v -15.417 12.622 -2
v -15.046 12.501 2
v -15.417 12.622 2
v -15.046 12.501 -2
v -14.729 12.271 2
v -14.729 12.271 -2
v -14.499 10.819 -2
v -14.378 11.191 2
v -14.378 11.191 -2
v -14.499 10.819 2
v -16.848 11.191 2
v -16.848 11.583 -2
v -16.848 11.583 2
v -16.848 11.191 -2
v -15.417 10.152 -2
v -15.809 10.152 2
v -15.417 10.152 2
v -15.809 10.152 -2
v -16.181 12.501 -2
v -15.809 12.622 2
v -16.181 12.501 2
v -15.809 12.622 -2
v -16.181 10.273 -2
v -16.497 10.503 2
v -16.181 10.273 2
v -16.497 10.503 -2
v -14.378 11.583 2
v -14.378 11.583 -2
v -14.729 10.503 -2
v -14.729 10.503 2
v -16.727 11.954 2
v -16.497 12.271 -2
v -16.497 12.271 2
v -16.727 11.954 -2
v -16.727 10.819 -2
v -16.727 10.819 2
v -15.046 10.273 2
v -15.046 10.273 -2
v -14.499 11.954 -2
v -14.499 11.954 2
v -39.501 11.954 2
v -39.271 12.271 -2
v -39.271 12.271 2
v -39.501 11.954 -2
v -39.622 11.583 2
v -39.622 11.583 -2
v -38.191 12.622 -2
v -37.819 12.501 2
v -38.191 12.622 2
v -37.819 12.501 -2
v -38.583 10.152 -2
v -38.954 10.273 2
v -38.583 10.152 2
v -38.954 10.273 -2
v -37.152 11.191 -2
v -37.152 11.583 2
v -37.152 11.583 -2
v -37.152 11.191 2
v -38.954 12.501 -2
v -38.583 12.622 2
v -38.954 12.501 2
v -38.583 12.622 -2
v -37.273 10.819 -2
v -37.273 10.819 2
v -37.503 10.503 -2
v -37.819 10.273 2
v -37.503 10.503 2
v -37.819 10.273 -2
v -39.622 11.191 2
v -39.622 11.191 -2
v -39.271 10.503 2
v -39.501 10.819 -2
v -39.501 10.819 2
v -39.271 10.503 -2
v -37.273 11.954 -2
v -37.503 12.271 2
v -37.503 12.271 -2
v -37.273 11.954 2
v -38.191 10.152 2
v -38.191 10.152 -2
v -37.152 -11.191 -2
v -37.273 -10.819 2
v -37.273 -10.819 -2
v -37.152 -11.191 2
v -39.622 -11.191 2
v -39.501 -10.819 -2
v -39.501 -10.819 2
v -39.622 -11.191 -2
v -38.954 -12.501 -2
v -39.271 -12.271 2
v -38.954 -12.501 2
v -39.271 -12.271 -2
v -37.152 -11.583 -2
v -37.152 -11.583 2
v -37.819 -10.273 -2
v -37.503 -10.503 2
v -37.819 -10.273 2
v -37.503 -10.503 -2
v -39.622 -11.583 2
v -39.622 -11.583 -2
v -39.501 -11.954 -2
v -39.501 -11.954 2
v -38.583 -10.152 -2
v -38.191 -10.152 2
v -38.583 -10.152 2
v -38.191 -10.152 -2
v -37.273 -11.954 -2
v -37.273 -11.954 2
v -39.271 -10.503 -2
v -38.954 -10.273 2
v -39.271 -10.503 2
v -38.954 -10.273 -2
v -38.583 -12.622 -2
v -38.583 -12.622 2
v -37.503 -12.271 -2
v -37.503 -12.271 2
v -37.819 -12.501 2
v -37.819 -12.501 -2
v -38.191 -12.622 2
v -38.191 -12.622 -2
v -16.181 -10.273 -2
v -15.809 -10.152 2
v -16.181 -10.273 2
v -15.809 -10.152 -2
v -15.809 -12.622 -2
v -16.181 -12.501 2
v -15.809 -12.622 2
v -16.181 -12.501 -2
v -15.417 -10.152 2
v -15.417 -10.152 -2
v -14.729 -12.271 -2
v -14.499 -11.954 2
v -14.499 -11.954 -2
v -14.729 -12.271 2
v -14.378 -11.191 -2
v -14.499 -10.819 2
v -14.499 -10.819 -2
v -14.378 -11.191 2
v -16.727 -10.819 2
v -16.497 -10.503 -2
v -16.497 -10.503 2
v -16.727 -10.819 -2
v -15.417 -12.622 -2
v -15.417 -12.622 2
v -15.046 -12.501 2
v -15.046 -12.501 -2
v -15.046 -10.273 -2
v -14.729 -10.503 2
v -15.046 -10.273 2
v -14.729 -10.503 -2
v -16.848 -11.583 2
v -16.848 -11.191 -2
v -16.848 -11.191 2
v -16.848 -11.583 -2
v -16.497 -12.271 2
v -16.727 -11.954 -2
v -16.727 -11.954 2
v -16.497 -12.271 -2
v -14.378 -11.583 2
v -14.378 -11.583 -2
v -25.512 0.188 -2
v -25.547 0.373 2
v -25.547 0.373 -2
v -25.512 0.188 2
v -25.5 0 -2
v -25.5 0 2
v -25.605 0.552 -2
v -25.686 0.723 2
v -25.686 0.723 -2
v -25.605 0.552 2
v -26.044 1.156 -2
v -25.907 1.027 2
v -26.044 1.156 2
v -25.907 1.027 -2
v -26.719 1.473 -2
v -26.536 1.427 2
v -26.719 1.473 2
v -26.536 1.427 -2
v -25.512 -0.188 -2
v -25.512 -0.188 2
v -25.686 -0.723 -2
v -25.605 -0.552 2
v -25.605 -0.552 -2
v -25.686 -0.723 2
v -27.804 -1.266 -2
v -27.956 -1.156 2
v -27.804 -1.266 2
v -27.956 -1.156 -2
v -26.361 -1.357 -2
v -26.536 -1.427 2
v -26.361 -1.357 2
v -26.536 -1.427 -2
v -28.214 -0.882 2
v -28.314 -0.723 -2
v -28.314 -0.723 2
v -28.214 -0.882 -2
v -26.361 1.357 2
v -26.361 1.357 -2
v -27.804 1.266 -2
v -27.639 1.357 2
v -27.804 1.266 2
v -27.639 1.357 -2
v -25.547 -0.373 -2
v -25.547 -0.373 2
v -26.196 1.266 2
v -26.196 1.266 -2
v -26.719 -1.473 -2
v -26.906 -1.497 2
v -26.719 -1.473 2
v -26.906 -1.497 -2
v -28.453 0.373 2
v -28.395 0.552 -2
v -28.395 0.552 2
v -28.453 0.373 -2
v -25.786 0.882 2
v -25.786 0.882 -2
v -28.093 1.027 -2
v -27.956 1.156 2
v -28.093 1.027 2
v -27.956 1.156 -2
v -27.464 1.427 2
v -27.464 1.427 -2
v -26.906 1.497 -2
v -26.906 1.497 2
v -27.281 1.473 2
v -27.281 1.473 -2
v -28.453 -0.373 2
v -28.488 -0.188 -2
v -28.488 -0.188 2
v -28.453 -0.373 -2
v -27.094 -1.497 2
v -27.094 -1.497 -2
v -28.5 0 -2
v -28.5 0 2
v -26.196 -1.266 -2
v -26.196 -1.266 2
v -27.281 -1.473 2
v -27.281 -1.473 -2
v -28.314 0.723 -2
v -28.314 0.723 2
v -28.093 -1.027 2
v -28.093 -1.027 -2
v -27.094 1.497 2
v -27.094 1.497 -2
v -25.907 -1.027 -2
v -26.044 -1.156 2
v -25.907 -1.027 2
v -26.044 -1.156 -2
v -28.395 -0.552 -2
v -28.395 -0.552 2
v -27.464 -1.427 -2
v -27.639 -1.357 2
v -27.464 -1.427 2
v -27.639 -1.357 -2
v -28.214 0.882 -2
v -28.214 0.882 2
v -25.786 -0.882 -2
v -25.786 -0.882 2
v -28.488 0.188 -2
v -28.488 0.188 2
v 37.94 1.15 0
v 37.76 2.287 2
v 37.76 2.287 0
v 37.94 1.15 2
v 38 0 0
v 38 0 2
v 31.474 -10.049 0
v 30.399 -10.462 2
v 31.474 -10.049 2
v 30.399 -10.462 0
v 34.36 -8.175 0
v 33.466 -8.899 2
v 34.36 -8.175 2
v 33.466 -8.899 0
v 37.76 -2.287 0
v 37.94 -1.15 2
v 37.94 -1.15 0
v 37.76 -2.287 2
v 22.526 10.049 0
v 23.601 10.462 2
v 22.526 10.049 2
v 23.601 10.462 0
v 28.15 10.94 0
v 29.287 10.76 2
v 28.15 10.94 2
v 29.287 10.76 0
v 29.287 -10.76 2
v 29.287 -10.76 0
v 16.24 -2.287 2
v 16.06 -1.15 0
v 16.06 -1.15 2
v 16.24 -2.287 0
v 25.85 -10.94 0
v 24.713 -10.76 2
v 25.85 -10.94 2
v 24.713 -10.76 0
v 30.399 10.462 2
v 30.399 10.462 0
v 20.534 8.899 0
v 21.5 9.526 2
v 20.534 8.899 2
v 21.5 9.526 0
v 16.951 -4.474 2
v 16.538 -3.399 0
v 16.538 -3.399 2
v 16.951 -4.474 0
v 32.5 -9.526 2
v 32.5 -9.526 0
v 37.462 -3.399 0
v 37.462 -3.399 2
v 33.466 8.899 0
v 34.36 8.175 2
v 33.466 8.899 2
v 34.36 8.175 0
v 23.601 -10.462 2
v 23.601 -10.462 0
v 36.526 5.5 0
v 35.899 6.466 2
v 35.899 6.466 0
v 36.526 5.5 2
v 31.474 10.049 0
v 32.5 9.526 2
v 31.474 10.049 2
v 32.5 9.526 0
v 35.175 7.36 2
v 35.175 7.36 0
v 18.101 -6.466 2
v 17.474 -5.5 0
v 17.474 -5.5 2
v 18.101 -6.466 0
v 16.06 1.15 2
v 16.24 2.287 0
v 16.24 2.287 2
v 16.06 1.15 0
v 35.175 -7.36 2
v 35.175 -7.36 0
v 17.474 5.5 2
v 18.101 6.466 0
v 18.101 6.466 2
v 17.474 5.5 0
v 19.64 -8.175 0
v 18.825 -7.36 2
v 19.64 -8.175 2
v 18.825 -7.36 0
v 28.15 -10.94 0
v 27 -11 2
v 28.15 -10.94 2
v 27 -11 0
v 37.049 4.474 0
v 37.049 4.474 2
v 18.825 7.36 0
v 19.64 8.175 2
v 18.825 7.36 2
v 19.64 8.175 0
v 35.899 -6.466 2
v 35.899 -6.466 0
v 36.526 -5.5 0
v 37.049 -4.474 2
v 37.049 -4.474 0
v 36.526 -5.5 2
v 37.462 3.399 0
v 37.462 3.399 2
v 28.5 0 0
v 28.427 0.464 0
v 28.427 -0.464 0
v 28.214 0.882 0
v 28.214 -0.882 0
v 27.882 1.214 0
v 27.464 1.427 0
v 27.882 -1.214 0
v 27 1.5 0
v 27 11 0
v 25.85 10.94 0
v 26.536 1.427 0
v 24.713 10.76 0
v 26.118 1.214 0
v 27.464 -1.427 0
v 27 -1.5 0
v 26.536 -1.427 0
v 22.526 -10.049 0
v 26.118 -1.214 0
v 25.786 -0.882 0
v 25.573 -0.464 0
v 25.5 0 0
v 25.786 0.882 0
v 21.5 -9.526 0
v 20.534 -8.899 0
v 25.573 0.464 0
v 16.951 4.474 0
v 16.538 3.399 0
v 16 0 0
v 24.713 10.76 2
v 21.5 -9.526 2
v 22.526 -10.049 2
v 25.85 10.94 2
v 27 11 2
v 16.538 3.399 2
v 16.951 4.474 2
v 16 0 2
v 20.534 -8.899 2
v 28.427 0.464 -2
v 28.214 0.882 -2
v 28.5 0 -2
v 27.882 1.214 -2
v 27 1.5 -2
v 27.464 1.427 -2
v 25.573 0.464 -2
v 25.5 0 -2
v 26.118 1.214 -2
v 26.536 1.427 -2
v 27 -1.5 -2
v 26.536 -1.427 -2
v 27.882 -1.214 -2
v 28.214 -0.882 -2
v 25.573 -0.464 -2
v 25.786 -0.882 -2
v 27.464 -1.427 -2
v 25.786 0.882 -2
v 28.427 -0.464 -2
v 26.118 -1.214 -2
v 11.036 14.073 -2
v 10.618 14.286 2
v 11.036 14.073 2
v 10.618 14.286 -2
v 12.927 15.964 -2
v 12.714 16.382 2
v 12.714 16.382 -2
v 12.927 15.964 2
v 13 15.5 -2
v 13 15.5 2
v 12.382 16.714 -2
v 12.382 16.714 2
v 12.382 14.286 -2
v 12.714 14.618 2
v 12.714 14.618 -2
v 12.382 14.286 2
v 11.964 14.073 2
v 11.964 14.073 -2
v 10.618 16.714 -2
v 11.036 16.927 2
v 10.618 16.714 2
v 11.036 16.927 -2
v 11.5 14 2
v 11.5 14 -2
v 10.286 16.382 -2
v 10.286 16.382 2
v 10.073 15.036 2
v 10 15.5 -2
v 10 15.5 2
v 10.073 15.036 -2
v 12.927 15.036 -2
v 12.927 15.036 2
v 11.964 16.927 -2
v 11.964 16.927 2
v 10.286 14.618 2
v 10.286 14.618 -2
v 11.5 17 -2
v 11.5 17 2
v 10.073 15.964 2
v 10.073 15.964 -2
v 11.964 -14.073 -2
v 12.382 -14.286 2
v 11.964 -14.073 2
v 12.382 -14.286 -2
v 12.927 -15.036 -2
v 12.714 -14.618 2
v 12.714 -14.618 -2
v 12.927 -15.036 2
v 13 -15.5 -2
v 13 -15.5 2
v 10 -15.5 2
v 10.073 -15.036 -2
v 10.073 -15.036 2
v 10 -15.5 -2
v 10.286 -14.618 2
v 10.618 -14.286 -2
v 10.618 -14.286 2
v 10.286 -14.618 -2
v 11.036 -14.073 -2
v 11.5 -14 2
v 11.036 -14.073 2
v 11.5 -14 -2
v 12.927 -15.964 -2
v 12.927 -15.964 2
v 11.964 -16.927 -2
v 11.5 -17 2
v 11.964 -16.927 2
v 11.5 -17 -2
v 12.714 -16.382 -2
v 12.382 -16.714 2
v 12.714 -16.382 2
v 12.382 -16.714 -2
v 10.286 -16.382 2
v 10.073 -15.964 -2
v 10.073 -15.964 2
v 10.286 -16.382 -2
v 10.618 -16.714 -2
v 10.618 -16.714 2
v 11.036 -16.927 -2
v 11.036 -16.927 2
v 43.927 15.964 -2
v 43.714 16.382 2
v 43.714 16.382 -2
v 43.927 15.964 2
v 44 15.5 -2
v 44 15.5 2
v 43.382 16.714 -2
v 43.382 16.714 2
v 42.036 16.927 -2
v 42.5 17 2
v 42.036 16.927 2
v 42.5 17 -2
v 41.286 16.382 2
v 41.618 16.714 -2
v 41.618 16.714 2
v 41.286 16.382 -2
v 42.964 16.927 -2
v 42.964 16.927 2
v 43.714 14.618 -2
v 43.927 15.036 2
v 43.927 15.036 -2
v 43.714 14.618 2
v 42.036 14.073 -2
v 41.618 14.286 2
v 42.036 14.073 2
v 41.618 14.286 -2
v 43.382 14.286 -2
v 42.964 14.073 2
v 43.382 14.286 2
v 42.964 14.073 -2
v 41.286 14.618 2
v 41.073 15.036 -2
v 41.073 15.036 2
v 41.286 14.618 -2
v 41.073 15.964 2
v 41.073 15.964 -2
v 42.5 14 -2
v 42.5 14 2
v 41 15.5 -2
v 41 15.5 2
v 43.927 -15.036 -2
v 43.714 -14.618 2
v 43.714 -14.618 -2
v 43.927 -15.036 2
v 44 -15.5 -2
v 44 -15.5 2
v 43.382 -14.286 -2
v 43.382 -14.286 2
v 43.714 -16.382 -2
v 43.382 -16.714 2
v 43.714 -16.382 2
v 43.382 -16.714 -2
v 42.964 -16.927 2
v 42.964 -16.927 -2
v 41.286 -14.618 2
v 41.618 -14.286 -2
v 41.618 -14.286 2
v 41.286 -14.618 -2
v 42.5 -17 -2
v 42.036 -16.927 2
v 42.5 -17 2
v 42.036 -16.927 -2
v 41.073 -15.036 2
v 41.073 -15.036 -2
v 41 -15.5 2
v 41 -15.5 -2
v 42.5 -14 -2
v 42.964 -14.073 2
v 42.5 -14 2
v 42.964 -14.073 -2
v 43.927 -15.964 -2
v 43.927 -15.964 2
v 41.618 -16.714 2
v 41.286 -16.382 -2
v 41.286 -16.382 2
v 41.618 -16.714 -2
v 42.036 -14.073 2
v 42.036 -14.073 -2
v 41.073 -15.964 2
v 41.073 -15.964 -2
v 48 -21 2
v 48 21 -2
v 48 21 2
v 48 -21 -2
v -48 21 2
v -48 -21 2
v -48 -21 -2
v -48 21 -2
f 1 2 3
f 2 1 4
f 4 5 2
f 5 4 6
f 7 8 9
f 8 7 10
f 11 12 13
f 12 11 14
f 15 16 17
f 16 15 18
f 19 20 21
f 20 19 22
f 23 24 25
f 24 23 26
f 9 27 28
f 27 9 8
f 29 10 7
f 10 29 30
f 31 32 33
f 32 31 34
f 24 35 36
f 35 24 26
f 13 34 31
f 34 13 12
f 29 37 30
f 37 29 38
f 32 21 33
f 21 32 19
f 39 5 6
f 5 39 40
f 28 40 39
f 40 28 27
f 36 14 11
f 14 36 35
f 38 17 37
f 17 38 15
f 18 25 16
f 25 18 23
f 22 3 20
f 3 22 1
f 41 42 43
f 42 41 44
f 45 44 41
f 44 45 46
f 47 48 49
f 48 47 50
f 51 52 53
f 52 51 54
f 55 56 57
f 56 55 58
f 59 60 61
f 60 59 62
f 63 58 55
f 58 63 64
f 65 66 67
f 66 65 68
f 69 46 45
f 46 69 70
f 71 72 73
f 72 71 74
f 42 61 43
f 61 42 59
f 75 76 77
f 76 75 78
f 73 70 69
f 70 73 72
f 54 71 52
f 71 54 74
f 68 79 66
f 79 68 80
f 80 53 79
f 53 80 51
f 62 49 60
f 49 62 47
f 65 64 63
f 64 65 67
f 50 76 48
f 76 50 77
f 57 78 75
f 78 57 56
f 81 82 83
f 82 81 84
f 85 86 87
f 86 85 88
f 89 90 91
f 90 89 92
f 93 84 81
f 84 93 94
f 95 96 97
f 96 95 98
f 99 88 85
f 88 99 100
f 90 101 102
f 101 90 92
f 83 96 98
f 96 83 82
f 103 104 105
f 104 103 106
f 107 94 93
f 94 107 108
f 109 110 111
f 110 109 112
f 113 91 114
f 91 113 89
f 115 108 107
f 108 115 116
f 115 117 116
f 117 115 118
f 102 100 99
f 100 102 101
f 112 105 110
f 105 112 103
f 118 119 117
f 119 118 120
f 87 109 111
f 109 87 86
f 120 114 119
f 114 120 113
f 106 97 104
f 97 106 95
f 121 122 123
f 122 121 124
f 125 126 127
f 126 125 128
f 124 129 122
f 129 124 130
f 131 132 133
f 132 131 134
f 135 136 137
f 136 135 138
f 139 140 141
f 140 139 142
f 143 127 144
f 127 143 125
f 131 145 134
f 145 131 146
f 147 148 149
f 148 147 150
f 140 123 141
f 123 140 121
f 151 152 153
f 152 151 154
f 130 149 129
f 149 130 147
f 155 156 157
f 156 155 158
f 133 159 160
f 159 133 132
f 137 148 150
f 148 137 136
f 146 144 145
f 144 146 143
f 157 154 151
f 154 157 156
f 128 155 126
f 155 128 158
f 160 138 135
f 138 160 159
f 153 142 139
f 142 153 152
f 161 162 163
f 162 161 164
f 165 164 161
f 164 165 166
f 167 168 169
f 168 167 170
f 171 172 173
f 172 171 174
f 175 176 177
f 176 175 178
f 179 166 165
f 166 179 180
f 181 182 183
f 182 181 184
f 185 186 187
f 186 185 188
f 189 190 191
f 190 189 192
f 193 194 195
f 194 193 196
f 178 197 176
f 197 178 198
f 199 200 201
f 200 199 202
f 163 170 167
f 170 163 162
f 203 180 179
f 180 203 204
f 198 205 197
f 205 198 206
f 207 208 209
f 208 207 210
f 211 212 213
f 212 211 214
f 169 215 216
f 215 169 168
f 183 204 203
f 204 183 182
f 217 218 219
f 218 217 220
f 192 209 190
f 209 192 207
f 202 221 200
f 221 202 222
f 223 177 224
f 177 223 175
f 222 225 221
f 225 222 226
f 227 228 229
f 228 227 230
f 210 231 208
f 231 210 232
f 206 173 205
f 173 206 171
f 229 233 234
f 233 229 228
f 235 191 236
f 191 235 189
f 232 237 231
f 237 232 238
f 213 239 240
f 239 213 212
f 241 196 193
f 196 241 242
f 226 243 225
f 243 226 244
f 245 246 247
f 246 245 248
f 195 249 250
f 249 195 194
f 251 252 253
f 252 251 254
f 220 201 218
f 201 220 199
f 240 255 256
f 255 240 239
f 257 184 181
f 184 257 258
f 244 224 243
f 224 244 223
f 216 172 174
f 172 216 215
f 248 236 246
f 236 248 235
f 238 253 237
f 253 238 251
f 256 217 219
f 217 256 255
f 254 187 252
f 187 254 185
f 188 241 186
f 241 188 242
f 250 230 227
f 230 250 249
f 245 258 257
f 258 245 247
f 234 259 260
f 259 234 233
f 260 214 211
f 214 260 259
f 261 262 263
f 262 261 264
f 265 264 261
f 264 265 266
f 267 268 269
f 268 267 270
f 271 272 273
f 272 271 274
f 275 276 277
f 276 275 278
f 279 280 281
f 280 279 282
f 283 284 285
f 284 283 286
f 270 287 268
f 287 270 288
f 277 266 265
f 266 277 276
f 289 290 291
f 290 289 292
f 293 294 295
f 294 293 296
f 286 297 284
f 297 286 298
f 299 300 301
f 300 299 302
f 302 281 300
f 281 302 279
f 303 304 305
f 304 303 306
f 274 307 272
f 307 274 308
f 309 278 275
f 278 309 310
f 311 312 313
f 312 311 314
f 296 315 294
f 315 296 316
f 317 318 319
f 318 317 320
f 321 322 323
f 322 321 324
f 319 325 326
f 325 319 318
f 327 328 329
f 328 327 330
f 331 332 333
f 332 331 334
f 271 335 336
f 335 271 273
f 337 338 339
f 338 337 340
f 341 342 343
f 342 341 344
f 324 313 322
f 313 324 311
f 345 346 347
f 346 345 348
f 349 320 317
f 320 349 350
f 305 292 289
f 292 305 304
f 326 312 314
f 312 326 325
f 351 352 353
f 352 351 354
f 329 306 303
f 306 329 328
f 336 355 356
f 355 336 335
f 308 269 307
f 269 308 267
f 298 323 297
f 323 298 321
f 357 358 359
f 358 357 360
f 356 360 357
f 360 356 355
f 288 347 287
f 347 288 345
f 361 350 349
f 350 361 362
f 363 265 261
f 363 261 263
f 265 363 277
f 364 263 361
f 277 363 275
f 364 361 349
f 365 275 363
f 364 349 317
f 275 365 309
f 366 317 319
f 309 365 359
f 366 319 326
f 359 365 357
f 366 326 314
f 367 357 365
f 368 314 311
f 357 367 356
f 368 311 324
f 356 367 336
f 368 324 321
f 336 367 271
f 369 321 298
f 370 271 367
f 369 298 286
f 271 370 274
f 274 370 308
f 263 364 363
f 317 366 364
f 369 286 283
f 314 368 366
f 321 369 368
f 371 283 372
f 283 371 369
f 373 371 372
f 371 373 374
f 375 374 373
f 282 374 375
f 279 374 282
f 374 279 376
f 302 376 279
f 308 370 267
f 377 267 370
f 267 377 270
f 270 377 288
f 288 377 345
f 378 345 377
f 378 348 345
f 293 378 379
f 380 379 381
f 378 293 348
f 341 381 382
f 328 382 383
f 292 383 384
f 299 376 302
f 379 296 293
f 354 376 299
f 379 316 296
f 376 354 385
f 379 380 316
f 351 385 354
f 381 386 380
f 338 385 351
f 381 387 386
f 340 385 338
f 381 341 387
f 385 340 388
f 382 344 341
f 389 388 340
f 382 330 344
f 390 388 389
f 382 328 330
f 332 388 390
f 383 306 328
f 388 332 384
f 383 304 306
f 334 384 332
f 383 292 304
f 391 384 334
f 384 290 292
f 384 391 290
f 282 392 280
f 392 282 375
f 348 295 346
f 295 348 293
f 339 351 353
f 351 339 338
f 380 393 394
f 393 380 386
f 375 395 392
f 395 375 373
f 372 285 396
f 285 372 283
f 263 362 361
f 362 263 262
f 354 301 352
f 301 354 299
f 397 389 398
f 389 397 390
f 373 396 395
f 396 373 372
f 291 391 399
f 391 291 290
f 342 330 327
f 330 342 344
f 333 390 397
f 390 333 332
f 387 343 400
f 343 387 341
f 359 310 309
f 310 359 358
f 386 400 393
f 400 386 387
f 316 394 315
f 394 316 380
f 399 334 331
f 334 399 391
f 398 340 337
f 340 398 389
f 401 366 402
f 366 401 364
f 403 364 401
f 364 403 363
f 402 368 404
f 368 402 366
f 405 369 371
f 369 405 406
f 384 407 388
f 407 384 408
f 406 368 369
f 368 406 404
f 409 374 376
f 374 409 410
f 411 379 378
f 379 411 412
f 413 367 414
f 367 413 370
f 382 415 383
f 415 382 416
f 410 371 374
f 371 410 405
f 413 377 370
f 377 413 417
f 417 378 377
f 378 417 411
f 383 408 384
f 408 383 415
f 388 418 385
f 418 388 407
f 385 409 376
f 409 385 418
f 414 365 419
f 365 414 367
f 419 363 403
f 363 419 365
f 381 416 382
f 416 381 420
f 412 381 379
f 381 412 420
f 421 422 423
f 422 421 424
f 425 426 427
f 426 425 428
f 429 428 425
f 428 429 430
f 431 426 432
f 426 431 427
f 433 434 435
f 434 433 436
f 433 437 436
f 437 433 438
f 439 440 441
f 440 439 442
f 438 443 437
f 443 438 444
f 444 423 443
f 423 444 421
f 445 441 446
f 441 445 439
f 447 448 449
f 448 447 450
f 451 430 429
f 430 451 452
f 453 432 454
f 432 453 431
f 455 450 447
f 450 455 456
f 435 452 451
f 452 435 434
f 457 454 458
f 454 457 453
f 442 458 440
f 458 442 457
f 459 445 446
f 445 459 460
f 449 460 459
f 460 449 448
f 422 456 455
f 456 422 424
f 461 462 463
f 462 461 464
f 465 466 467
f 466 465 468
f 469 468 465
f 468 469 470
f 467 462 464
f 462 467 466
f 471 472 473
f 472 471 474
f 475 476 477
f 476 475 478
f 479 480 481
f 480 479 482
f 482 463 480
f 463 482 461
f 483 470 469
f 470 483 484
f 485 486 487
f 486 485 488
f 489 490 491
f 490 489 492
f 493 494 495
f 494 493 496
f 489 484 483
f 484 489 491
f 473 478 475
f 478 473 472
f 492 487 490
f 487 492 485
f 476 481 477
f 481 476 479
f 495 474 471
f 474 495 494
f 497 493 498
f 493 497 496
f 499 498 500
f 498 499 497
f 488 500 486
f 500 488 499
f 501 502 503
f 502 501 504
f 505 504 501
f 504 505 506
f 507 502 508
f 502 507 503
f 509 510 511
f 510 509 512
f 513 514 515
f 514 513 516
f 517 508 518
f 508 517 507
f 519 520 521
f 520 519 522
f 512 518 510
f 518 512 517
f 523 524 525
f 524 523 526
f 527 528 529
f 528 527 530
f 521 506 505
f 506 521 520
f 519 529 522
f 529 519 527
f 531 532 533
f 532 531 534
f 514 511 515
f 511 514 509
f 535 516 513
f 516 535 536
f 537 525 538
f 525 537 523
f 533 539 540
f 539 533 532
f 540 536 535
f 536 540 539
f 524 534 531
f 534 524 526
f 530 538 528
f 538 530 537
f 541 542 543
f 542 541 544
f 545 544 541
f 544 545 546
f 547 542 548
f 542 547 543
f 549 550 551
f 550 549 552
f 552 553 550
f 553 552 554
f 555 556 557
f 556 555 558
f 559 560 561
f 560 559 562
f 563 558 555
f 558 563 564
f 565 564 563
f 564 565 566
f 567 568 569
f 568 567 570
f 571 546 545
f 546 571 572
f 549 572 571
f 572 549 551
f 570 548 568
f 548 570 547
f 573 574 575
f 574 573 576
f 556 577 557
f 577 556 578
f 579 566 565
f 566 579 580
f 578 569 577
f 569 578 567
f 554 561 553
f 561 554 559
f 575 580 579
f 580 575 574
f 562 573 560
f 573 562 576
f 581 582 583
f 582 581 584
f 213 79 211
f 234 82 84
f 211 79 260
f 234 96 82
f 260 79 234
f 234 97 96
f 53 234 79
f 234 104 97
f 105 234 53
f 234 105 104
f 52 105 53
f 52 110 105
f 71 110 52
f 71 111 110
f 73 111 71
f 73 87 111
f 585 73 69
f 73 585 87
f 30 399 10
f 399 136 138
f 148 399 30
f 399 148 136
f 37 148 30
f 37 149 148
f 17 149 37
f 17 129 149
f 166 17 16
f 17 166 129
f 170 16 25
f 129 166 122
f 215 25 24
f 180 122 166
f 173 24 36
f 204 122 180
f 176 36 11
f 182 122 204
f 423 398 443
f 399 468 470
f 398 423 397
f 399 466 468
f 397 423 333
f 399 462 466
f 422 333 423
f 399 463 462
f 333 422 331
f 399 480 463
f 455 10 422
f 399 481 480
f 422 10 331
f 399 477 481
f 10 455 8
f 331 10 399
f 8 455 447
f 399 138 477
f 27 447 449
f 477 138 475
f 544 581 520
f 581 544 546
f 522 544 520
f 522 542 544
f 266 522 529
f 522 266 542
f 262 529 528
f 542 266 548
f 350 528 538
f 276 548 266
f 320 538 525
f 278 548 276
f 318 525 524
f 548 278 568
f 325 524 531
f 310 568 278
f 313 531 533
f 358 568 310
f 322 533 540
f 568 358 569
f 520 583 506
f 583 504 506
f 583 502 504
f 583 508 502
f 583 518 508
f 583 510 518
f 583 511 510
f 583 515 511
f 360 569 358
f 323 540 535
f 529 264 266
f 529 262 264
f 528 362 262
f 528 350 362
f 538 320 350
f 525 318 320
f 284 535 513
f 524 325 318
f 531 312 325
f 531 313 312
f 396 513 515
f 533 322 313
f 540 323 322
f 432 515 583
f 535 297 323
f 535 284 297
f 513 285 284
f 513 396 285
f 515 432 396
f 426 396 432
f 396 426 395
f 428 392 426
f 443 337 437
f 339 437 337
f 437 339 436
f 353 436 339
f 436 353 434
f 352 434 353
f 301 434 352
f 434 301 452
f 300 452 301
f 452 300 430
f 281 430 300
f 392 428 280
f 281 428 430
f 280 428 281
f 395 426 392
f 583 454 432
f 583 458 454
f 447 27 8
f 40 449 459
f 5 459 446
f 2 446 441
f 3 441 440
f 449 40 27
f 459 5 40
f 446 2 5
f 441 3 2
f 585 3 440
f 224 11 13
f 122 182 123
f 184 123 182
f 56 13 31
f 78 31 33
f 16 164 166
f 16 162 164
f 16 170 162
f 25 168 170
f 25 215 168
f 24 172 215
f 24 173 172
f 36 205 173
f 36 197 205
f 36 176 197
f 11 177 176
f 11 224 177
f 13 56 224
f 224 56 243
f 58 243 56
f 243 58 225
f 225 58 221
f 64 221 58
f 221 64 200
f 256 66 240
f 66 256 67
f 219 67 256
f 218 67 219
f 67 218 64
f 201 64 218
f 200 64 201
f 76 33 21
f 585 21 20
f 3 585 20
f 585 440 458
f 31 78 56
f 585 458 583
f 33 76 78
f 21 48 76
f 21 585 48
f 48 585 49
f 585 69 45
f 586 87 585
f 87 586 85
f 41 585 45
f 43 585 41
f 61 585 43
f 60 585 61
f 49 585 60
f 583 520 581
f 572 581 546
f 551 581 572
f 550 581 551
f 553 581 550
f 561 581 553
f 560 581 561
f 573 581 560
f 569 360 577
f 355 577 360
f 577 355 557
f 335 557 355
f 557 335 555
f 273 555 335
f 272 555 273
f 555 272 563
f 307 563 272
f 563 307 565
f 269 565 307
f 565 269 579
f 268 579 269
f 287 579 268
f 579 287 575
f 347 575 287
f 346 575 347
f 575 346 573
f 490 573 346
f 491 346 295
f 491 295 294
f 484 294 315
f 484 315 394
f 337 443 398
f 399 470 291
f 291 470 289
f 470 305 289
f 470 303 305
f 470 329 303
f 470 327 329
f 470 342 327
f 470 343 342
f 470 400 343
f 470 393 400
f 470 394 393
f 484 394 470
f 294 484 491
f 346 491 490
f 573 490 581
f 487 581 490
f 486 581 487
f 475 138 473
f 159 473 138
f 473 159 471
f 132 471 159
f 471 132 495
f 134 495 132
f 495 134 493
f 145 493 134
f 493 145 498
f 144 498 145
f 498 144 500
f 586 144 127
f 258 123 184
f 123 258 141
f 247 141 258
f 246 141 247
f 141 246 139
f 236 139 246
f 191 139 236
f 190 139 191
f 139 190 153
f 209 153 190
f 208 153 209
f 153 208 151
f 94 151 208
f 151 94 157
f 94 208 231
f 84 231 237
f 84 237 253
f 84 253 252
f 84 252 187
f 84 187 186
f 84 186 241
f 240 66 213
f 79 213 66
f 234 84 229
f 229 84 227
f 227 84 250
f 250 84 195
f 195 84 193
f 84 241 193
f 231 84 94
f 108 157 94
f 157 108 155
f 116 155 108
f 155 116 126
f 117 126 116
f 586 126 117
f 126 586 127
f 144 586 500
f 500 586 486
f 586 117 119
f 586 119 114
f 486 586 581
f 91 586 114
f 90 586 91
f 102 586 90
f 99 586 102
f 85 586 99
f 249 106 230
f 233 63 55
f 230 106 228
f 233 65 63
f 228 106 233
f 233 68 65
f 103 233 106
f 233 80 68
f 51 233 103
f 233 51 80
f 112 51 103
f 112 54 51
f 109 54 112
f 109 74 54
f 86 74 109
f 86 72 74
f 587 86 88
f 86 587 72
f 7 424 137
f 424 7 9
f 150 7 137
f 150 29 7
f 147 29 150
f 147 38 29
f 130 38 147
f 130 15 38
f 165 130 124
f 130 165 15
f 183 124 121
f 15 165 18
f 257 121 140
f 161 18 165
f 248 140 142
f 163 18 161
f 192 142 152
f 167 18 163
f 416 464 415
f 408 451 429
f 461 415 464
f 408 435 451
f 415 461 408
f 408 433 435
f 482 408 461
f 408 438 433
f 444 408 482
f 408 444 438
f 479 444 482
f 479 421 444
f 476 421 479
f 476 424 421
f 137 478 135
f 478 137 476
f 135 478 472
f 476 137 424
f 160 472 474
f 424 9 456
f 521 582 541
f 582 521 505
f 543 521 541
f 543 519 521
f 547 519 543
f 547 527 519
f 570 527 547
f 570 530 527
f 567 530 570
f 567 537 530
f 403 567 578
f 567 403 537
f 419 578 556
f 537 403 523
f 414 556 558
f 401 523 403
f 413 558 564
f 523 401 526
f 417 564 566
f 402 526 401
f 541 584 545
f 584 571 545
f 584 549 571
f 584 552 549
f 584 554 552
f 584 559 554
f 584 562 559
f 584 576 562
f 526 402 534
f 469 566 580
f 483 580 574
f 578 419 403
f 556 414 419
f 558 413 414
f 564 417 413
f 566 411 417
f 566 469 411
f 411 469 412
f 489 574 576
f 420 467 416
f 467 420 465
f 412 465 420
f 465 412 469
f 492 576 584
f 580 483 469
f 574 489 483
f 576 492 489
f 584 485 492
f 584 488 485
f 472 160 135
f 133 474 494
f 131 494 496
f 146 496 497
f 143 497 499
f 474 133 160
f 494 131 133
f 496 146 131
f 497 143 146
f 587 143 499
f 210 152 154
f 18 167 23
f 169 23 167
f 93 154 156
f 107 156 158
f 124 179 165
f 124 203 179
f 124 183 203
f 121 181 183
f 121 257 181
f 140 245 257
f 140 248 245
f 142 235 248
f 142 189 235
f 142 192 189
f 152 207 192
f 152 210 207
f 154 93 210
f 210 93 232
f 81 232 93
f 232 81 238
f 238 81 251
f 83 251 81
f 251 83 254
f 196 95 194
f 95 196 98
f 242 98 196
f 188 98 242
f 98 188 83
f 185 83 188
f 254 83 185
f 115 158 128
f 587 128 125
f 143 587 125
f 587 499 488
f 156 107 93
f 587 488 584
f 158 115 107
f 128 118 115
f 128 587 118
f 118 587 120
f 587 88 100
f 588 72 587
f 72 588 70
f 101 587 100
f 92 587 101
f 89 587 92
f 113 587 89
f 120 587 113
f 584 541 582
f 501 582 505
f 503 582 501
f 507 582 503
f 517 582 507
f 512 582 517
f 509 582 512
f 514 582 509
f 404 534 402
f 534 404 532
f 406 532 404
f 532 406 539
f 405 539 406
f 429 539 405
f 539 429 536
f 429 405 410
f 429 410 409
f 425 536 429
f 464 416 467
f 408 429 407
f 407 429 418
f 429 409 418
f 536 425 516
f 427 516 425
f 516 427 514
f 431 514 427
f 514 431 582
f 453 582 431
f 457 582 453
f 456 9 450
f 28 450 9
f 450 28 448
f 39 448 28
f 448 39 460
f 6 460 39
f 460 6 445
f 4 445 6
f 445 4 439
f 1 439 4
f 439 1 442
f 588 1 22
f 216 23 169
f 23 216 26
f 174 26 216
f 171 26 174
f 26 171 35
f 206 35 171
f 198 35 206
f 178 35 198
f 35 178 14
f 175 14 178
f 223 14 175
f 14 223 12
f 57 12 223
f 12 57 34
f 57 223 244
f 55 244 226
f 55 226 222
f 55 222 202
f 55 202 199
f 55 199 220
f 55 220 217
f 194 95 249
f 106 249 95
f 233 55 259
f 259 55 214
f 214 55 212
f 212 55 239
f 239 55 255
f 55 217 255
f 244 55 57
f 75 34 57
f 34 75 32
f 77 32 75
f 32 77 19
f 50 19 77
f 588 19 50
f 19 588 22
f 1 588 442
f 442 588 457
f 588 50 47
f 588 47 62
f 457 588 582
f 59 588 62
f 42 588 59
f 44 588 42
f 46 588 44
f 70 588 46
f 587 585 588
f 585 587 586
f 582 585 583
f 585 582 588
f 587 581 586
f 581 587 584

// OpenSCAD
/*
 * stencil.scad -- stencil for the mounting holes
 *
 * (c) 2015 Prof Dr Andreas Mueller, Hochschule Rapperswil
 */

distance = 54;
l = 35;
l1 = l * 2 / sqrt(3);
radius = (12 + l1/2) / 2;

large_holes = 0;
motorholedistance = 31;
mho = motorholedistance/2;

difference() {
	cube([distance + 42, 42, 4], center = true);
	translate([-distance/2, 0, 0])
        union() {
            for (alpha = [ 45 : 90 : 315 ]) {
                rotate([0, 0, alpha])
                    translate([radius, 0, 0])
                        cylinder(r = 1.25, h = 6, $fn = 20, center = true);
            }
            cylinder(r = 1.5 + large_holes * 6, h = 6, center = true, $fn = 50);
        }
	translate([distance/2, 0, 0])
        union() {
            translate([0, 0, 2])
                cylinder(r = 11, h = 4, center = true, $fn = 60);
            cylinder(r = 1.5 + large_holes * 2, h = 6, center = true, $fn = 20);
            translate([-mho, mho, 0])
                cylinder(r = 1.5, h = 6, center = true, $fn = 20);
            translate([-mho, -mho, 0])
                cylinder(r = 1.5, h = 6, center = true, $fn = 20);
            translate([+mho, mho, 0])
                cylinder(r = 1.5, h = 6, center = true, $fn = 20);
            translate([+mho, -mho, 0])
                cylinder(r = 1.5, h = 6, center = true, $fn = 20);
        }
}
